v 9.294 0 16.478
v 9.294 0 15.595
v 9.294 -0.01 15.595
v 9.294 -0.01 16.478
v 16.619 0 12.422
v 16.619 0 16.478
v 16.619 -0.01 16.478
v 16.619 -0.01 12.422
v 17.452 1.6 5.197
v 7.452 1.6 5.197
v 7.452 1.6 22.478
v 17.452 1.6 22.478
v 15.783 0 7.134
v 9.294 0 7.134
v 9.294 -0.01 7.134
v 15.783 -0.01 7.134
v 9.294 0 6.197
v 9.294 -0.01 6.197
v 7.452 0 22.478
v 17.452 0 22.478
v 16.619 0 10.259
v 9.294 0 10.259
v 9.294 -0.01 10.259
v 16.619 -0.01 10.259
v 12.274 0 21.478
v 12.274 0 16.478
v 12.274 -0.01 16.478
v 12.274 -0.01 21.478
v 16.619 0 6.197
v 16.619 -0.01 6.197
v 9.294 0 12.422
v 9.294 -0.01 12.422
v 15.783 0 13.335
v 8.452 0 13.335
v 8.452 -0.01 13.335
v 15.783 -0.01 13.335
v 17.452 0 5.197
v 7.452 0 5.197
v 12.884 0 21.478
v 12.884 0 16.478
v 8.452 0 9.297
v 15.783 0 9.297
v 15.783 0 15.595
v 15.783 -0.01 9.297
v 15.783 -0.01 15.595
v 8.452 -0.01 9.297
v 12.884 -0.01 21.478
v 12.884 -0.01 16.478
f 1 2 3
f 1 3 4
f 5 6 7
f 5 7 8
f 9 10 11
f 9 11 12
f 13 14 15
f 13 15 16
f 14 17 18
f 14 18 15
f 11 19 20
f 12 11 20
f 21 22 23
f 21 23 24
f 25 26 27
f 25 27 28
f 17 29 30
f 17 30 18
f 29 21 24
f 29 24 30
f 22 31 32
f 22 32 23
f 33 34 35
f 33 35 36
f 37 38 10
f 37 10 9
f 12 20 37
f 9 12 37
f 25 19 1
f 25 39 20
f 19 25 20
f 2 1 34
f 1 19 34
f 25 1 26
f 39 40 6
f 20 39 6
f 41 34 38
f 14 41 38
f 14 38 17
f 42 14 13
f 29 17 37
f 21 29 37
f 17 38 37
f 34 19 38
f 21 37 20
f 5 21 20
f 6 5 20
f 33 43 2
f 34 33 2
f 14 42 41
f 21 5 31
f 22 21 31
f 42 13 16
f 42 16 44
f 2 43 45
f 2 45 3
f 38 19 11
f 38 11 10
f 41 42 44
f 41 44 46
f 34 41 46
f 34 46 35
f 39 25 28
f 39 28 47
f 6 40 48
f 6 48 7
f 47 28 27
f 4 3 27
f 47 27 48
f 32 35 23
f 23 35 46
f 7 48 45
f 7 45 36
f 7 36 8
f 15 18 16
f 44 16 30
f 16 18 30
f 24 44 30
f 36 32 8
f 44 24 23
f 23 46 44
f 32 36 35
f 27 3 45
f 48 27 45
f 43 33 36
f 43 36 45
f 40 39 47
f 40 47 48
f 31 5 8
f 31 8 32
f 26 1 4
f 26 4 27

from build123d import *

# Parameters (mm, degrees)
SKETCH_2_W      = 10
SKETCH_2_H      = 17.280767805
EXTRUDE_1_DEPTH = 1.6
EXTRUDE_2_DEPTH = 0.01


with BuildPart() as part:
    # Эскиз2 → Бобышка-Вытянуть1 (new body)
    with BuildSketch(Plane(origin=(0, 0, 0), x_dir=(1, 0, 0), z_dir=(0, 1, 0))):
        with Locations((12.452403324, -13.837242614)):
            Rectangle(SKETCH_2_W, SKETCH_2_H)
    extrude(amount=EXTRUDE_1_DEPTH)

    # Эскиз1 → Бобышка-Вытянуть2 (add)
    with BuildSketch(Plane(origin=(0, 0, 0), x_dir=(1, 0, 0), z_dir=(0, 1, 0))):
        Polygon((12.273882011, -21.477626516), (12.884093179, -21.477626516), (12.884093179, -16.477626516), (16.618556013, -16.477626516), (16.618556013, -12.422038386), (9.29364382, -12.422038386), (9.29364382, -10.258848538), (16.618556013, -10.258848538), (16.618556013, -6.196858711), (9.29364382, -6.196858711), (9.29364382, -7.134240978), (15.783213366, -7.134240978), (15.783213366, -9.297430827), (8.452403324, -9.297430827), (8.452403324, -13.335385211), (15.783213366, -13.335385211), (15.783213366, -15.594716831), (9.29364382, -15.594716831), (9.29364382, -16.477626516), (12.273882011, -16.477626516), align=None)
    extrude(amount=-EXTRUDE_2_DEPTH)


solid = part.part
